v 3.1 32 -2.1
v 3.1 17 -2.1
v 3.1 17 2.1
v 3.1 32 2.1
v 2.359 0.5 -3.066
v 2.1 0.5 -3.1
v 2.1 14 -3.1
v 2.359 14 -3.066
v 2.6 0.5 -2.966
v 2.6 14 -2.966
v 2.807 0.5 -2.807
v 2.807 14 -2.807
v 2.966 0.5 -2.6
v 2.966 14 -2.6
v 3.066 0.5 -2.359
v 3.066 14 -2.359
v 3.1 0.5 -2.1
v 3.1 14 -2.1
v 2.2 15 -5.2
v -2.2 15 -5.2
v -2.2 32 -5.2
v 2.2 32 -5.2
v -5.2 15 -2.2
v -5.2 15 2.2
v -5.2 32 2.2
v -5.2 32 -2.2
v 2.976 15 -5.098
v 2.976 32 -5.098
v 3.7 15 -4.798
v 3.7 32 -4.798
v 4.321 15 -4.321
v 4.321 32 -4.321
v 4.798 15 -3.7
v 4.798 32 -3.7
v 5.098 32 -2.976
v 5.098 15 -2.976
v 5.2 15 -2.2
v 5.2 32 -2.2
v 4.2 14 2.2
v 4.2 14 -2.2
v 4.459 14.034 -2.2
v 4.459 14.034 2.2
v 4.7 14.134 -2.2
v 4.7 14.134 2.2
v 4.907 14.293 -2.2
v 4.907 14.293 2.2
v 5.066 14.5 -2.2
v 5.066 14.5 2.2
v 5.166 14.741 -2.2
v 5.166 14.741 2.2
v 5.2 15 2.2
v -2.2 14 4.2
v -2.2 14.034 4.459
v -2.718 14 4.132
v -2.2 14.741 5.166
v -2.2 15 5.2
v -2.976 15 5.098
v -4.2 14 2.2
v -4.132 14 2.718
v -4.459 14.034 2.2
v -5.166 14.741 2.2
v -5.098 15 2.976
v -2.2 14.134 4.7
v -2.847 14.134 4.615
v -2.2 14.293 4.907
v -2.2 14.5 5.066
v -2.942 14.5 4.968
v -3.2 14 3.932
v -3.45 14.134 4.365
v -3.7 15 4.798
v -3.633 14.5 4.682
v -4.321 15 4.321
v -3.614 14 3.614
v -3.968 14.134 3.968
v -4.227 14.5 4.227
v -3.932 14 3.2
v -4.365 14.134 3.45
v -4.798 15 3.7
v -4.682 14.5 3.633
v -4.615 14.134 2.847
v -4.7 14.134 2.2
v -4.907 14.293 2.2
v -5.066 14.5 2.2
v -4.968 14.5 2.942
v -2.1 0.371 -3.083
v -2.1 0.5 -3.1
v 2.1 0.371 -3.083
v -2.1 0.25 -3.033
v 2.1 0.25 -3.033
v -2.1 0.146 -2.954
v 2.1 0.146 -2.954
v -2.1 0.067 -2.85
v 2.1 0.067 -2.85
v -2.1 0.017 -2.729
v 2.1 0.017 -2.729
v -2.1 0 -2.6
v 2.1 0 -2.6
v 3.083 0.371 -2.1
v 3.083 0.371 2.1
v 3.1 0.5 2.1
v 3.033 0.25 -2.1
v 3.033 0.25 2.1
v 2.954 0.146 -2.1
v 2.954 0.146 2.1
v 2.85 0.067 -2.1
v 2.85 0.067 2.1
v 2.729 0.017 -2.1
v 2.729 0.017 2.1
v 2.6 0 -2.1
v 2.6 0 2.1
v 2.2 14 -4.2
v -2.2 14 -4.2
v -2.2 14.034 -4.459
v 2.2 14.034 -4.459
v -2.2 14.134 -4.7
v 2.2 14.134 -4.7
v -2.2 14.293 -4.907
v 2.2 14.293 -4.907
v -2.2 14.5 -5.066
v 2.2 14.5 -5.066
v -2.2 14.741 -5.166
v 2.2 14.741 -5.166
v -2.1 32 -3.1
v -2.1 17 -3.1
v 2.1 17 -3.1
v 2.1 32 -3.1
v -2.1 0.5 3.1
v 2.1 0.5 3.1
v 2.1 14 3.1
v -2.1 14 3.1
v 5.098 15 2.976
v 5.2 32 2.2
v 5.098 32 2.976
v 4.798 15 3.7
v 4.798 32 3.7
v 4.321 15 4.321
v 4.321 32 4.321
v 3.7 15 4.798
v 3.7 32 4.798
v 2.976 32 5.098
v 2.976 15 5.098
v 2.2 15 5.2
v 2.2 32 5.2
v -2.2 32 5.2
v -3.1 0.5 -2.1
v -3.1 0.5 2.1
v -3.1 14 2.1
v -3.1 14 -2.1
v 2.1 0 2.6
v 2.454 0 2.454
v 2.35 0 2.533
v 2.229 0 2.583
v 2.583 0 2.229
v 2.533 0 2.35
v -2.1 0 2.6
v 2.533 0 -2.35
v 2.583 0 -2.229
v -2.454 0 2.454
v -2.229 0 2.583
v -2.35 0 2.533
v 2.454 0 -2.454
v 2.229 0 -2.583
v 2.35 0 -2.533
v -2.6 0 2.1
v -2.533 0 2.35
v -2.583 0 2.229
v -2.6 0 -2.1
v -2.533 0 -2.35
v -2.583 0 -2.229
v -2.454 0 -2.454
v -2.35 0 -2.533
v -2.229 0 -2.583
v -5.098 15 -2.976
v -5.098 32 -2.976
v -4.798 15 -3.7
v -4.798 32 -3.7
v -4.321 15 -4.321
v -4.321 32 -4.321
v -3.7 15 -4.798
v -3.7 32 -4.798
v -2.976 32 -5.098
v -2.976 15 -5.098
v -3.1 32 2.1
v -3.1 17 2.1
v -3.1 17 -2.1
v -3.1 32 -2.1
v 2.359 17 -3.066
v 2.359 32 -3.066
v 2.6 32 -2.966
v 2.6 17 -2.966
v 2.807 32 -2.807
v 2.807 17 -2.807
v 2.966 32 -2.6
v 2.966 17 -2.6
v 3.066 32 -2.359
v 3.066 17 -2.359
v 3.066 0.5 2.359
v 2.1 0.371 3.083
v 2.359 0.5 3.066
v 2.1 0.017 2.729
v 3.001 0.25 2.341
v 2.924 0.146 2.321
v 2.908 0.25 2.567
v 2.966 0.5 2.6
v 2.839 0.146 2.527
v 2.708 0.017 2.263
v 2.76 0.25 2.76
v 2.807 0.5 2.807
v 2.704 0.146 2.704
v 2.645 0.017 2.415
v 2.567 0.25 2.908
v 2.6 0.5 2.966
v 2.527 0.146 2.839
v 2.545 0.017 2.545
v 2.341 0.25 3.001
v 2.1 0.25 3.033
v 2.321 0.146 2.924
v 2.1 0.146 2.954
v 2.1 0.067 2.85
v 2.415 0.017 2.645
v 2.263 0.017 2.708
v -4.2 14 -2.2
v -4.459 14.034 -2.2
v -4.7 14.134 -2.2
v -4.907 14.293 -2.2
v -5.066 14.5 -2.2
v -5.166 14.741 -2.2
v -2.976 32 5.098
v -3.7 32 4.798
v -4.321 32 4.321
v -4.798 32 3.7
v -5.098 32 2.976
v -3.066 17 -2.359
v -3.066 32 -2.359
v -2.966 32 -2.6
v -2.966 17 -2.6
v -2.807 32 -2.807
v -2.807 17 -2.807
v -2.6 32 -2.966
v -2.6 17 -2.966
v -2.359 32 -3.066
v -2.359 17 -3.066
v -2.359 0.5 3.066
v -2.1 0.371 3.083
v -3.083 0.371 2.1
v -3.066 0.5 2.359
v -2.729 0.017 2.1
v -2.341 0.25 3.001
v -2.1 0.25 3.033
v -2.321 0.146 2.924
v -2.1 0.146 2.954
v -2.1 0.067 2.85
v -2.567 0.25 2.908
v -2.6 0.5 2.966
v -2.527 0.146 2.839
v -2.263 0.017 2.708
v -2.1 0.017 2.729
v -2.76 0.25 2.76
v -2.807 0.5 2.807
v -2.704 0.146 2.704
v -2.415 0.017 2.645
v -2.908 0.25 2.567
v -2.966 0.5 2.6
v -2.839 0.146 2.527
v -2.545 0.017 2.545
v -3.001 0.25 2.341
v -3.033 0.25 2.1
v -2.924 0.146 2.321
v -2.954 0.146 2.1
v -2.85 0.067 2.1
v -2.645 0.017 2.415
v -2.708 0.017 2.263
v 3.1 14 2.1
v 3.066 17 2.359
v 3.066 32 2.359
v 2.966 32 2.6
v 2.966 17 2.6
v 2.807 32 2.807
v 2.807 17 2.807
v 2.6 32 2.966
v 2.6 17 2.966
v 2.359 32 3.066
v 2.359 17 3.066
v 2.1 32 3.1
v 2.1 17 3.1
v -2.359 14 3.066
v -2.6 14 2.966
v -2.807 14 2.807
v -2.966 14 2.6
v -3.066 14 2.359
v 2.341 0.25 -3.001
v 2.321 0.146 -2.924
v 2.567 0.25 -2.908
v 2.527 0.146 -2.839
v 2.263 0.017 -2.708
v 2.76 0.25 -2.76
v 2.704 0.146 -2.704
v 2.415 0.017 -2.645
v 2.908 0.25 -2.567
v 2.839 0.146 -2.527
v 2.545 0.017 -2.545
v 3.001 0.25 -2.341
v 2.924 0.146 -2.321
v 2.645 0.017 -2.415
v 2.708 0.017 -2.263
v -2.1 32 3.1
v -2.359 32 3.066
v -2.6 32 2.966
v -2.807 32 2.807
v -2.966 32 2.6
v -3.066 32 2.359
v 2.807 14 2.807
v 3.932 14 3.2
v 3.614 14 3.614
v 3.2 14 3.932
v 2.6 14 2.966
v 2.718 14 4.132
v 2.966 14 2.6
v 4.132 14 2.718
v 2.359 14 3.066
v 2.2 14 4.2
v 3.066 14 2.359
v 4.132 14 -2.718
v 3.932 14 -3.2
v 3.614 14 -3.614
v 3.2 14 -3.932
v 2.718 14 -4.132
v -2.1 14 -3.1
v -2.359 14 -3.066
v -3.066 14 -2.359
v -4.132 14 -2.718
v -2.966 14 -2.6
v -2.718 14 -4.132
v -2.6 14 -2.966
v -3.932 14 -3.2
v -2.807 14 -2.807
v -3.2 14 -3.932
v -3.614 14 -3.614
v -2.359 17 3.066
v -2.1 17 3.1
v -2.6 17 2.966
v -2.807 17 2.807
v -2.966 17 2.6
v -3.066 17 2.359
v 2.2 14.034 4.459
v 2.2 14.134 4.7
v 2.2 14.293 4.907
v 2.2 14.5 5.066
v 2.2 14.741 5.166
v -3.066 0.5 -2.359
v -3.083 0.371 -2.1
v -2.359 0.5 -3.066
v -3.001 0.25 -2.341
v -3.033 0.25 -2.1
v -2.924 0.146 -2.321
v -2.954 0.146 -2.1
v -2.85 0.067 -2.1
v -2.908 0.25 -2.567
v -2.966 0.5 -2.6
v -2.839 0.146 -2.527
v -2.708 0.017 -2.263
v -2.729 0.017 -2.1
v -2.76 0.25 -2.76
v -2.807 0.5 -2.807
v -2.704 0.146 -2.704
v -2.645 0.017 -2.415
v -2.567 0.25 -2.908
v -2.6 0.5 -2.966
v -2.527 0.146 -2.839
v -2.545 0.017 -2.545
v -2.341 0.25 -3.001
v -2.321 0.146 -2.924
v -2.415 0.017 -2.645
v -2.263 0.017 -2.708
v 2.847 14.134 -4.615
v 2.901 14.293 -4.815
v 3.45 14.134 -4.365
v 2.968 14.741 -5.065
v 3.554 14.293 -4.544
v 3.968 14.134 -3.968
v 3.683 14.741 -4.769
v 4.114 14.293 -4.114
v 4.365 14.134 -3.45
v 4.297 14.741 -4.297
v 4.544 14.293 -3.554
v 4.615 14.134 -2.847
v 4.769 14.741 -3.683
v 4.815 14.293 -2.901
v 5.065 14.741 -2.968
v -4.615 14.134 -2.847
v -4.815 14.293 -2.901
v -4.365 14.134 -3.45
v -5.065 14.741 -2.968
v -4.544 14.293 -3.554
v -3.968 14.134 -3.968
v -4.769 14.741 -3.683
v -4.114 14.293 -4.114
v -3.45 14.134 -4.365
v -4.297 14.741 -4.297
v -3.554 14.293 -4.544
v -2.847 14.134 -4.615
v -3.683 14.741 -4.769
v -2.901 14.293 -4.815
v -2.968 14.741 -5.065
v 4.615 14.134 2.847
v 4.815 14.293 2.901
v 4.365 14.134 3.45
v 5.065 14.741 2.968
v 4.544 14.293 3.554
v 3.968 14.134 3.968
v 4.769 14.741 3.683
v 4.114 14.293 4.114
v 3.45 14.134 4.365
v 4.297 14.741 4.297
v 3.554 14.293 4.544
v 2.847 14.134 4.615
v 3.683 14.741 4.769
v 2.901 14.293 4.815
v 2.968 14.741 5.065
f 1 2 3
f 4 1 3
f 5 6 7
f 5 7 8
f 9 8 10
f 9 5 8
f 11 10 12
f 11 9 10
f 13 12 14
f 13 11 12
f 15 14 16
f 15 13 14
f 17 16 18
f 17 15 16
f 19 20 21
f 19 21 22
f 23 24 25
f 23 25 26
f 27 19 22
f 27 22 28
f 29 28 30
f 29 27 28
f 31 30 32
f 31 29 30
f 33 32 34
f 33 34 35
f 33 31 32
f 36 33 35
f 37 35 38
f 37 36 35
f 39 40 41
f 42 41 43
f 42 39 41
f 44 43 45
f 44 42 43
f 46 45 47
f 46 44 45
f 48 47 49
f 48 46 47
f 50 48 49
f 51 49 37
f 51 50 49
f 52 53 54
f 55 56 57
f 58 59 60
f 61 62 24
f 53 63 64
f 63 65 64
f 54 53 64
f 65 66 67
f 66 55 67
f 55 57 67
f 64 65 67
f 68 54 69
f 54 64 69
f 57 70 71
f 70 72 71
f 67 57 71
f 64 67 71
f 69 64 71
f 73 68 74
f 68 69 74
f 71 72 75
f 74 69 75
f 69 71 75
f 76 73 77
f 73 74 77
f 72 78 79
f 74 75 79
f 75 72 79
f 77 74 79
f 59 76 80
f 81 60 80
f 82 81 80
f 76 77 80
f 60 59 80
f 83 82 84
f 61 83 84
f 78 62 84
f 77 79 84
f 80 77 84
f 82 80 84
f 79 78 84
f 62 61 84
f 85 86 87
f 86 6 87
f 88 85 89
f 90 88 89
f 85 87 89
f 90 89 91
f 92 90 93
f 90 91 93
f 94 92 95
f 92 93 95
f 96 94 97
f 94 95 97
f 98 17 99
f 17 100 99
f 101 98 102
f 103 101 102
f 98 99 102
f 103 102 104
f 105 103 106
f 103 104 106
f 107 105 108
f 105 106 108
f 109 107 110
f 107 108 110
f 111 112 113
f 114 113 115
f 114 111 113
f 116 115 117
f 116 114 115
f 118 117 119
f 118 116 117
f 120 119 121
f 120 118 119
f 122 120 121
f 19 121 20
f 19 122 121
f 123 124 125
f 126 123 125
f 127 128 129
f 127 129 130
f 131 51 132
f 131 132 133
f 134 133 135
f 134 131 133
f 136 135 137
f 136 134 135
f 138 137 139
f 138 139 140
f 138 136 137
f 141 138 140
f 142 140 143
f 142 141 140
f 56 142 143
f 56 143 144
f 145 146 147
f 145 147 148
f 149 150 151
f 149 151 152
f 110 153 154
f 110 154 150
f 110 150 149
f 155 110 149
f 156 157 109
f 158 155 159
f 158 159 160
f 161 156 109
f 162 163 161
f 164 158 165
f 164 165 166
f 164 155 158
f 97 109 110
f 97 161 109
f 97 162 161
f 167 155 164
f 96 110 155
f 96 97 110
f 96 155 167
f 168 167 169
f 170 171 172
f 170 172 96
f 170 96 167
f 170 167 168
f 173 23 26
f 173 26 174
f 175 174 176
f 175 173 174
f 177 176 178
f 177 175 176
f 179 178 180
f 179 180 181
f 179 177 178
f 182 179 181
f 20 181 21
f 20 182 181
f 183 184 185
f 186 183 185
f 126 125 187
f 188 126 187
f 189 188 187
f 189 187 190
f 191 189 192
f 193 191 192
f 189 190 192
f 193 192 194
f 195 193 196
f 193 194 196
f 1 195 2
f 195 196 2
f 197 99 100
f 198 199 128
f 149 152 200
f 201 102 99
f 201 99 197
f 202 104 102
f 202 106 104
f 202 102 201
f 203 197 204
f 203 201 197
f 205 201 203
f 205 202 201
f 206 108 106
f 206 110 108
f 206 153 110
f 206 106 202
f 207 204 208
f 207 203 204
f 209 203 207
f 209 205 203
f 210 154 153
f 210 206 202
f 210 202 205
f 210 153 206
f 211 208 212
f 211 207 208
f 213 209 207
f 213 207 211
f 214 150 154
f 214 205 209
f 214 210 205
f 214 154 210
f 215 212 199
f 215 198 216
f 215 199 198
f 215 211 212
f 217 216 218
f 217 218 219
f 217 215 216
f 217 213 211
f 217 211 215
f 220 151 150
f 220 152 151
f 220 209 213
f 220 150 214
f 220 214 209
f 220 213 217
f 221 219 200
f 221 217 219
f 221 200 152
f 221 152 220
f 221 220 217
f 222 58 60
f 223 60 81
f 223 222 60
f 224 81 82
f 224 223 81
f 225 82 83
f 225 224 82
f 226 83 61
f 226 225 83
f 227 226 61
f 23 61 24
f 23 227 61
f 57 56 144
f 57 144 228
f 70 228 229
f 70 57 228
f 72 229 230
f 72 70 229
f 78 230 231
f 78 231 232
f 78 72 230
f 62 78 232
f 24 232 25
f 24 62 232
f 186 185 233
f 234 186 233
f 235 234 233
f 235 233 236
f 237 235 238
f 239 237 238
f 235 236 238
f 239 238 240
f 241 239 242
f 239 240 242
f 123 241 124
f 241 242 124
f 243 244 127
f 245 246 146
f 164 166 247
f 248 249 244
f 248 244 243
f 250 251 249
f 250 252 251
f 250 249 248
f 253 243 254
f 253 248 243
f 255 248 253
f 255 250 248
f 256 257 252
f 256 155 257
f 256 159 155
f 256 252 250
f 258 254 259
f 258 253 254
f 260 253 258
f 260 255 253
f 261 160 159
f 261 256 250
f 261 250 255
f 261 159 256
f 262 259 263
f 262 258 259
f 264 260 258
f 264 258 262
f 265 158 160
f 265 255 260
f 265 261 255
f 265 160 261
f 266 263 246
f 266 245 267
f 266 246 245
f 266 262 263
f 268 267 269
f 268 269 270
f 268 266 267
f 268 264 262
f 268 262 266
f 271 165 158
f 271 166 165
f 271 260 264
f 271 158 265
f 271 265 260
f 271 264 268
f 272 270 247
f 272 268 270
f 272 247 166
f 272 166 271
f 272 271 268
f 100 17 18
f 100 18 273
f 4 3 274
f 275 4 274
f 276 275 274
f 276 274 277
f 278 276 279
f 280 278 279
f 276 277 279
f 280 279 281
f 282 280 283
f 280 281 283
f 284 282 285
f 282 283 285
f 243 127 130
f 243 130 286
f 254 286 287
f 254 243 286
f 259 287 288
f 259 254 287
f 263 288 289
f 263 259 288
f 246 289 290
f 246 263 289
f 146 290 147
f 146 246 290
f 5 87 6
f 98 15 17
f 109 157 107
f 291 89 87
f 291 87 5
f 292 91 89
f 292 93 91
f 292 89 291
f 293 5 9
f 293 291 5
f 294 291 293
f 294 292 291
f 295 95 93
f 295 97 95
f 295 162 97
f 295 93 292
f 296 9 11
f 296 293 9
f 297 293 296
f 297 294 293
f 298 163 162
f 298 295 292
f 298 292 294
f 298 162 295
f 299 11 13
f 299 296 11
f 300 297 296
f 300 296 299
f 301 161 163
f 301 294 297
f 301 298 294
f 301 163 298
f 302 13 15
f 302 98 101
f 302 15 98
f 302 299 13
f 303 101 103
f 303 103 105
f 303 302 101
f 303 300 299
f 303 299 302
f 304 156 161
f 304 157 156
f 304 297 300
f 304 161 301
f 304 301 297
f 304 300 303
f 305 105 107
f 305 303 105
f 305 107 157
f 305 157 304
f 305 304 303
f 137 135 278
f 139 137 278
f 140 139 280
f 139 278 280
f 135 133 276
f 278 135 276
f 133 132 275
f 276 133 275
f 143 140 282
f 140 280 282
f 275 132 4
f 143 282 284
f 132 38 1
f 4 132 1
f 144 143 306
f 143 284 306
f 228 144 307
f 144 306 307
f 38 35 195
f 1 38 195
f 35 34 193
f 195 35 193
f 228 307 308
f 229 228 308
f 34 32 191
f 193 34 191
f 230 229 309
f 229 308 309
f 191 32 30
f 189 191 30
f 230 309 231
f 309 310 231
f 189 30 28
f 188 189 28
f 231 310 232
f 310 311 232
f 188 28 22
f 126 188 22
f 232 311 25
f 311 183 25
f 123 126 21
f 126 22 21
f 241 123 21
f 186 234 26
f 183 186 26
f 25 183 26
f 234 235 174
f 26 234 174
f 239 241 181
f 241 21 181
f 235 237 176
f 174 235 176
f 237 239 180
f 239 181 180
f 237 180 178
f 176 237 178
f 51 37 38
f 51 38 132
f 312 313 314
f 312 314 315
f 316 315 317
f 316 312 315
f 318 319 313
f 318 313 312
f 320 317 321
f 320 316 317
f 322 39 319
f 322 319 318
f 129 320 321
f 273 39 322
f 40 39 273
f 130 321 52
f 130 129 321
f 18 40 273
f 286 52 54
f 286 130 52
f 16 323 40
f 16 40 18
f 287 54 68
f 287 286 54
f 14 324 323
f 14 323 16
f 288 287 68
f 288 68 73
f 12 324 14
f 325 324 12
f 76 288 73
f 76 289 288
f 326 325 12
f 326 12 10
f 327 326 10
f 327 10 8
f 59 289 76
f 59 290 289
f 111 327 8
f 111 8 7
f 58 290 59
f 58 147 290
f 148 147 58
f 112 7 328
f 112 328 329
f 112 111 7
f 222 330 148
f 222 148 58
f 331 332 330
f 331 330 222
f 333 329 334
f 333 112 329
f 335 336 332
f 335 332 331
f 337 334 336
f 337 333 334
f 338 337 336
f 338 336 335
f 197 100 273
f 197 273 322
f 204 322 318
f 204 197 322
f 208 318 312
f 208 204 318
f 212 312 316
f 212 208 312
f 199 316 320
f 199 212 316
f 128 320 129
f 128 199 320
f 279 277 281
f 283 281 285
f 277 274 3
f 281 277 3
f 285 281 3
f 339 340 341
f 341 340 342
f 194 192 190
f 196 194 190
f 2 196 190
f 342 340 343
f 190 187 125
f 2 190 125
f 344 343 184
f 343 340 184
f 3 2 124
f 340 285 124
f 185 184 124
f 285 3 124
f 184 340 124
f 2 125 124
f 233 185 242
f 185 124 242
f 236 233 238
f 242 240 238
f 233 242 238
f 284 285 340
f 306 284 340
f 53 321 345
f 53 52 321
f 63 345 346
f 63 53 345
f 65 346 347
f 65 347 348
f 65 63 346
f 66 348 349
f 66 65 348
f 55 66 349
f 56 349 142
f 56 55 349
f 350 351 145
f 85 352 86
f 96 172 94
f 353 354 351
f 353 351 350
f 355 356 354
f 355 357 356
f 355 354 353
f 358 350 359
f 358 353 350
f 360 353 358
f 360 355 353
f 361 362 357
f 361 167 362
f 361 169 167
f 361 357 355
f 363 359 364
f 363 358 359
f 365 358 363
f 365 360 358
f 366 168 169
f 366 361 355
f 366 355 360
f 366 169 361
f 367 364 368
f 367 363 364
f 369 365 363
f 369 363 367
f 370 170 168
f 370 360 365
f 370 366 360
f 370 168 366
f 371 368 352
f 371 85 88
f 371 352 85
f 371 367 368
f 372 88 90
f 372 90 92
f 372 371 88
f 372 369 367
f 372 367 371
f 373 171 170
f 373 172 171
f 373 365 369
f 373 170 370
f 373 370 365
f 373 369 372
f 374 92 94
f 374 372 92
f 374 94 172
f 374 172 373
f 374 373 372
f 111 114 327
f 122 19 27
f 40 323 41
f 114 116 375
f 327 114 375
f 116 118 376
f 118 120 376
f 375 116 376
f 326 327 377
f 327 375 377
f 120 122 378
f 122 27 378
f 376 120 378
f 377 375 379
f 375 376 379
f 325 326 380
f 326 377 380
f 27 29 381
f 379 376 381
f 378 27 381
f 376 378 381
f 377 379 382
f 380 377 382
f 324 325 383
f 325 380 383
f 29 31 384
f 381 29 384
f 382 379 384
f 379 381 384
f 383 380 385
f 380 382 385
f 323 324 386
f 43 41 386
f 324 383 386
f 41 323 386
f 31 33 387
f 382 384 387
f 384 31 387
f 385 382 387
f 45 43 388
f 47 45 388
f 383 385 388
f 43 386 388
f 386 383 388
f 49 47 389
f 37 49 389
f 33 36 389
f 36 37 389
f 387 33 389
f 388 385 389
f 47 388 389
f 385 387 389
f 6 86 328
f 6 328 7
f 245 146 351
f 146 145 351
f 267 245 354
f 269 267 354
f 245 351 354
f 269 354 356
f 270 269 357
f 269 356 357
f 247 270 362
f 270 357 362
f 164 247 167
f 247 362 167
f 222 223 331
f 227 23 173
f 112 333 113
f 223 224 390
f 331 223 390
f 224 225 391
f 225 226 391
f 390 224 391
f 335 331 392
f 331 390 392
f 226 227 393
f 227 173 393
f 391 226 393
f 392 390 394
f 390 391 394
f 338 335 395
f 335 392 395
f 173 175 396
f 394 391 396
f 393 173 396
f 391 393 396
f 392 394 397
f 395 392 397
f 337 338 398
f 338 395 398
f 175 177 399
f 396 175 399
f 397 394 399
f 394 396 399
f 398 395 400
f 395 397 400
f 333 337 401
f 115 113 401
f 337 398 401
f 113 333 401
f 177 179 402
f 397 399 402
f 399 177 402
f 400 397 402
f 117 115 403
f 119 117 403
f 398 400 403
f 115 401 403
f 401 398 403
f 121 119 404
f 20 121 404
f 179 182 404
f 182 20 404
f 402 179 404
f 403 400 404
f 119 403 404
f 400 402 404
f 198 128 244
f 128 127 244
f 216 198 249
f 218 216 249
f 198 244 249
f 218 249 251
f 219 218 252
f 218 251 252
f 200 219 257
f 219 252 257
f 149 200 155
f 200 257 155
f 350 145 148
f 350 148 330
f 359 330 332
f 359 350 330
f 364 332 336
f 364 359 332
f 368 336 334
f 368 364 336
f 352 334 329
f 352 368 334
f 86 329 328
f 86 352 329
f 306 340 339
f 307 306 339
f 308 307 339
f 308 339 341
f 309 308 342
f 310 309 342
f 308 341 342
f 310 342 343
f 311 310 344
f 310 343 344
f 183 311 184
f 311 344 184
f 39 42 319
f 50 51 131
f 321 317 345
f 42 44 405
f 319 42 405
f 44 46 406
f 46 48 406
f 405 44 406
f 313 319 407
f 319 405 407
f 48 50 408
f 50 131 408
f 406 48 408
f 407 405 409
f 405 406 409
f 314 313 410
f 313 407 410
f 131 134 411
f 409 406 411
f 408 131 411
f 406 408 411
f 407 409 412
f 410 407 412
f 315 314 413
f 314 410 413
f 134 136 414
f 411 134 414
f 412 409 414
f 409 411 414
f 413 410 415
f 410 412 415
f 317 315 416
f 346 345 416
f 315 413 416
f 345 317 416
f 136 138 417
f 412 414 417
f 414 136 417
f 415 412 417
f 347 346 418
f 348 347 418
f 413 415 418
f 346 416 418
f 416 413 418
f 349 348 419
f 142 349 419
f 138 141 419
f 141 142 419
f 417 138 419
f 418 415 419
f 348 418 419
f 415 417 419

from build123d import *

# Parameters (mm, degrees)
BOSS_EXTRUDE1_DEPTH = 14
BOSS_EXTRUDE2_DEPTH = 18
CUT_EXTRUDE1_START  = -15
CUT_EXTRUDE1_DEPTH  = 15
FILLET4_R           = 1
FILLET5_R           = 0.5


with BuildPart() as part:
    # Sketch1 → Boss-Extrude1 (new body)
    with BuildSketch(Plane(origin=(0, 0, 0), x_dir=(1, 0, 0), z_dir=(0, 1, 0))):
        with BuildLine():
            Line((-2.1, 3.1), (2.1, 3.1))
            ThreePointArc((2.1, 3.1), (2.807106781, 2.807106781), (3.1, 2.1))
            Line((3.1, 2.1), (3.1, -2.1))
            ThreePointArc((3.1, -2.1), (2.807106781, -2.807106781), (2.1, -3.1))
            Line((2.1, -3.1), (-2.1, -3.1))
            ThreePointArc((-2.1, -3.1), (-2.807106781, -2.807106781), (-3.1, -2.1))
            Line((-3.1, -2.1), (-3.1, 2.1))
            ThreePointArc((-3.1, 2.1), (-2.807106781, 2.807106781), (-2.1, 3.1))
        make_face()
    extrude(amount=BOSS_EXTRUDE1_DEPTH)

    # Sketch2 → Boss-Extrude2 (add)
    with BuildSketch(Plane(origin=(0, 14, 0), x_dir=(1, 0, 0), z_dir=(0, 1, 0))):
        with BuildLine():
            Line((-2.2, 5.2), (2.2, 5.2))
            ThreePointArc((2.2, 5.2), (4.321320344, 4.321320344), (5.2, 2.2))
            Line((5.2, 2.2), (5.2, -2.2))
            ThreePointArc((5.2, -2.2), (4.321320344, -4.321320344), (2.2, -5.2))
            Line((2.2, -5.2), (-2.2, -5.2))
            ThreePointArc((-2.2, -5.2), (-4.321320344, -4.321320344), (-5.2, -2.2))
            Line((-5.2, -2.2), (-5.2, 2.2))
            ThreePointArc((-5.2, 2.2), (-4.321320344, 4.321320344), (-2.2, 5.2))
        make_face()
    extrude(amount=BOSS_EXTRUDE2_DEPTH)

    # Sketch3 → Cut-Extrude1 (cut)
    with BuildSketch(Plane(origin=(0, 32, 0), x_dir=(1, 0, 0), z_dir=(0, 1, 0)).offset(CUT_EXTRUDE1_START)):
        with BuildLine():
            Line((-2.1, 3.1), (2.1, 3.1))
            ThreePointArc((2.1, 3.1), (2.807106781, 2.807106781), (3.1, 2.1))
            Line((3.1, 2.1), (3.1, -2.1))
            ThreePointArc((3.1, -2.1), (2.807106781, -2.807106781), (2.1, -3.1))
            Line((2.1, -3.1), (-2.1, -3.1))
            ThreePointArc((-2.1, -3.1), (-2.807106781, -2.807106781), (-3.1, -2.1))
            Line((-3.1, -2.1), (-3.1, 2.1))
            ThreePointArc((-3.1, 2.1), (-2.807106781, 2.807106781), (-2.1, 3.1))
        make_face()
    extrude(amount=CUT_EXTRUDE1_DEPTH, mode=Mode.SUBTRACT)

    # Fillet4
    fillet4_edges = [part.edges().sort_by_distance(p)[0] for p in [
        (-4.321320344, 14, 4.321320344),
        (0, 14, 5.2),
        (4.321320344, 14, 4.321320344),
        (5.2, 14, 0),
        (4.321320344, 14, -4.321320344),
        (0, 14, -5.2),
        (-4.321320344, 14, -4.321320344),
        (-5.2, 14, 0),
    ]]
    fillet(fillet4_edges, radius=FILLET4_R)

    # Fillet5
    fillet5_edges = [part.edges().sort_by_distance(p)[0] for p in [
        (0, 0, -3.1),
        (2.807106781, 0, -2.807106781),
        (3.1, 0, 0),
        (2.807106781, 0, 2.807106781),
        (0, 0, 3.1),
        (-2.807106781, 0, 2.807106781),
        (-3.1, 0, 0),
        (-2.807106781, 0, -2.807106781),
    ]]
    fillet(fillet5_edges, radius=FILLET5_R)


solid = part.part
